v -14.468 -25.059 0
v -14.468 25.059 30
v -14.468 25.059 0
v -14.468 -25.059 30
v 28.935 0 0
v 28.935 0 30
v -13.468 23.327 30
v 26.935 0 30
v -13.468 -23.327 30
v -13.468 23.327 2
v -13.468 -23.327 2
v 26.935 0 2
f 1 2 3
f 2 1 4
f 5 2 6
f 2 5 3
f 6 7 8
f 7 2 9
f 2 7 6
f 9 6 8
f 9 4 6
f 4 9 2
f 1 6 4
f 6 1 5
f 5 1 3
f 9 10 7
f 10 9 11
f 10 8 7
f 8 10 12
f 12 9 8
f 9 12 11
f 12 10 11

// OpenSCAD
difference(){
cylinder(h=30,r=20*sqrt(PI)/sqrt(sqrt(3))+2,$fn=3);
    translate([0,0,2])
    cylinder(h=28.5,r=20*sqrt(PI)/sqrt(sqrt(3)),$fn=3);
}
